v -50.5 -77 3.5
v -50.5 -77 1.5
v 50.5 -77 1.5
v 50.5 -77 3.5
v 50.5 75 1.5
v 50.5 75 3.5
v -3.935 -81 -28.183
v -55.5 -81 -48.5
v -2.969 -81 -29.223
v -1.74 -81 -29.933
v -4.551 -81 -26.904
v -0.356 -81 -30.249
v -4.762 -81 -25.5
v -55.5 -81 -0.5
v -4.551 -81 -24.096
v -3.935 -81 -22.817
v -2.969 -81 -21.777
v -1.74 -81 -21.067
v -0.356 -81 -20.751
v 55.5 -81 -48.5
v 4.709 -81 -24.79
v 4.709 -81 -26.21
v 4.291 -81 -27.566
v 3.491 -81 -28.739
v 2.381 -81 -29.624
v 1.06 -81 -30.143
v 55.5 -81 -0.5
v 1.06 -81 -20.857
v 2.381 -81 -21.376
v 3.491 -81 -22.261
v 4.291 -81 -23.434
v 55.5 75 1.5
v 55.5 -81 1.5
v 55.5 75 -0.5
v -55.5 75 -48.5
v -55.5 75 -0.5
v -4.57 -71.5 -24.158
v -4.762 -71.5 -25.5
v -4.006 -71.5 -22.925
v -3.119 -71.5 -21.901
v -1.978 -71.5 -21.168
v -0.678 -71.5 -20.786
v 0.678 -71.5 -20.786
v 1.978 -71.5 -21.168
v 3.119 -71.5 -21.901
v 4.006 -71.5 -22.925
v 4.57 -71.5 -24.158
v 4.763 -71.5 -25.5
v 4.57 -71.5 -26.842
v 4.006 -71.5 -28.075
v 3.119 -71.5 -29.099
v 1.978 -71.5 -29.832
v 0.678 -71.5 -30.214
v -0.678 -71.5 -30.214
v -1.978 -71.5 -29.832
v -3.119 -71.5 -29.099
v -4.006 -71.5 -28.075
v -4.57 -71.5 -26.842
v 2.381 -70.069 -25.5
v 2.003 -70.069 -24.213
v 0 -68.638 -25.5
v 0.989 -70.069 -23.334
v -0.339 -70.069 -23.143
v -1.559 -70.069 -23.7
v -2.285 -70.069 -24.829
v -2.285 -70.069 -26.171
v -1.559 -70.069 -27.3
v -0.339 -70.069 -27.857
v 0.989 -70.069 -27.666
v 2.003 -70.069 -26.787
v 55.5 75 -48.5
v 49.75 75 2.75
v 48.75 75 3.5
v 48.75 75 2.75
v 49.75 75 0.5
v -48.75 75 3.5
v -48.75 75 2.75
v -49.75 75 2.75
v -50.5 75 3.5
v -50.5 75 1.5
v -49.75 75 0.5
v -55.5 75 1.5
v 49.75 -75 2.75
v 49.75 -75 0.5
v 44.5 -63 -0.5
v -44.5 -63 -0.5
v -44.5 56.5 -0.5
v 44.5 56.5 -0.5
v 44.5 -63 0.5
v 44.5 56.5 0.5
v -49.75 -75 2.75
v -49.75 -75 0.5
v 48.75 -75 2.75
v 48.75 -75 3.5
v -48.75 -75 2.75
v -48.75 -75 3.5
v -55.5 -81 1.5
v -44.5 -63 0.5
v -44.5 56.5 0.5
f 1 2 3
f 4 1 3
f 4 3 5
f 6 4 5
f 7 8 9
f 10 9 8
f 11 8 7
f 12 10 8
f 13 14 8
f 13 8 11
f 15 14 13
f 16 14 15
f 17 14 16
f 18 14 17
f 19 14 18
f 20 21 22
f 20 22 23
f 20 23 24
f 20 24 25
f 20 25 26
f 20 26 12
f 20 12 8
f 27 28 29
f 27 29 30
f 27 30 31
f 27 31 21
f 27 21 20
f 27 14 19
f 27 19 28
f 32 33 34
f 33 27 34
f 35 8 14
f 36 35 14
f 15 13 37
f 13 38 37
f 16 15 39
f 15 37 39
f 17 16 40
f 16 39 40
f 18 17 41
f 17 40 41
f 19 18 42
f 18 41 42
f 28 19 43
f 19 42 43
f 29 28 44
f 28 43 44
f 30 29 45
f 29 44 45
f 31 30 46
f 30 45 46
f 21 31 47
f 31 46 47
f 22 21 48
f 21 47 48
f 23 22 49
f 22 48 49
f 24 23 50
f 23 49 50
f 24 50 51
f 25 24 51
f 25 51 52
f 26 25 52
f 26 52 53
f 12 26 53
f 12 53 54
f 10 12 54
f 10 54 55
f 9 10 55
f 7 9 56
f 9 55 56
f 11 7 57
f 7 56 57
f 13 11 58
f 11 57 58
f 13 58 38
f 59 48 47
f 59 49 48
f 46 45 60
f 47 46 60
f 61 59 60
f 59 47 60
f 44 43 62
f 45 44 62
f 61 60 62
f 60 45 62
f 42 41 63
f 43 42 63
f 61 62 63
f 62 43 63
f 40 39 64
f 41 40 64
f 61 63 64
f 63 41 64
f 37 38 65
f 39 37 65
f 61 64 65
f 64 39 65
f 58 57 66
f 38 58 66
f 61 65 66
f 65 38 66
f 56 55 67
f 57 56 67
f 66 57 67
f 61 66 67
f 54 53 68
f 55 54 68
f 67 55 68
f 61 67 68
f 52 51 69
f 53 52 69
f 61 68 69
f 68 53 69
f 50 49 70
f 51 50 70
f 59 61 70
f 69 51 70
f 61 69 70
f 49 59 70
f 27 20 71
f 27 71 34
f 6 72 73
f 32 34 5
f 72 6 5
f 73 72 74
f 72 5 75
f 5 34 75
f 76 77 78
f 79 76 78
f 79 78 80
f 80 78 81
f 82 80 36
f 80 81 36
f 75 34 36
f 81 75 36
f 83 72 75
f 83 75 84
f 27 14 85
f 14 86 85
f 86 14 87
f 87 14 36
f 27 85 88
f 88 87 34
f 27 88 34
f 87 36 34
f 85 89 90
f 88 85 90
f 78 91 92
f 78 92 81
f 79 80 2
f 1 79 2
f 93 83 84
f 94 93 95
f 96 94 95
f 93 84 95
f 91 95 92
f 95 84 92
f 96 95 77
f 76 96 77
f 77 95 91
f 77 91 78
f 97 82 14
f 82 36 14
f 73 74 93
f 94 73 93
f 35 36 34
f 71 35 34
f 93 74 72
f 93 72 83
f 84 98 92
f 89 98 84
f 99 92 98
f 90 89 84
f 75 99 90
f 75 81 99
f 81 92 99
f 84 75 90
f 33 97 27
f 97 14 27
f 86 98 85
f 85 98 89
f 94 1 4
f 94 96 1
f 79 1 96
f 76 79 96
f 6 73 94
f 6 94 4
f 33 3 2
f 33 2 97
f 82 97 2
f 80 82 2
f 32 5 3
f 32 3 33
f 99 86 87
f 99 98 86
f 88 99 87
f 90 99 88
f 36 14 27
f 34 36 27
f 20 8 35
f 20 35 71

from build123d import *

# Parameters (mm, degrees)
F0_W      = 97.5
F0_H      = 150
F0_W_2    = 89
F0_H_2    = 119.5
F1_DEPTH  = 0.5
F3_DEPTH  = 1
F5_DEPTH  = 3
F6_W      = 150
F6_H      = 2.25
F7_DEPTH  = 1
F8_W      = 150
F8_H      = 2.25
F9_DEPTH  = 1
F10_W     = 111
F10_H     = 48
F11_DEPTH = 156
F13_D     = 9.525
F13_DEPTH = 9.5
F13_TIP   = 2.8615986981


with BuildPart() as f1:
    # F0 (on Top) → F1 (new body, symmetric)
    with BuildSketch(Plane.XY):
        Polygon((-50.5, -77), (-50.5, 75), (-55.5, 75), (-55.5, -81), (55.5, -81), (55.5, 75), (50.5, 75), (50.5, -77), align=None)
        Rectangle(F0_W, F0_H)
        with Locations((0, -3.25)):
            Rectangle(F0_W_2, F0_H_2, mode=Mode.SUBTRACT)
        Polygon((-48.75, -75), (-48.75, 75), (-50.5, 75), (-50.5, -77), (50.5, -77), (50.5, 75), (48.75, 75), (48.75, -75), align=None)
    extrude(amount=F1_DEPTH, both=True)

    # F2 (on face) → F3 (join)
    with BuildSketch(Plane.XY.offset(0.5)):
        Polygon((-50.5, -77), (-50.5, 75), (-55.5, 75), (-55.5, -81), (55.5, -81), (55.5, 75), (50.5, 75), (50.5, -77), align=None)
    extrude(amount=F3_DEPTH)

    # F4 (on face) → F5 (join)
    with BuildSketch(Plane.XY.offset(0.5)):
        Polygon((-48.75, -75), (-48.75, 75), (-50.5, 75), (-50.5, -77), (50.5, -77), (50.5, 75), (48.75, 75), (48.75, -75), align=None)
    extrude(amount=F5_DEPTH)

    # F6 (on face) → F7 (cut)
    with BuildSketch(Plane.YZ.offset(-48.75)):
        with Locations((0, 1.625)):
            Rectangle(F6_W, F6_H)
    extrude(amount=-F7_DEPTH, mode=Mode.SUBTRACT)

    # F8 (on face) → F9 (cut)
    with BuildSketch(Plane(origin=(48.75, 0, 0), x_dir=(0, -1, 0), z_dir=(-1, 0, 0))):
        with Locations((0, 1.625)):
            Rectangle(F8_W, F8_H)
    extrude(amount=-F9_DEPTH, mode=Mode.SUBTRACT)


with BuildPart() as f11:
    # F10 (on face) → F11 (new body)
    with BuildSketch(Plane.XZ.offset(81)):
        with Locations((0, -24.5)):
            Rectangle(F10_W, F10_H)
    extrude(amount=-F11_DEPTH)

    # F13
    with Locations(Plane.XZ.offset(81)):
        with Locations((0, -25.5)):
            Hole(F13_D / 2, depth=F13_DEPTH)
            with Locations((0, 0, -(F13_DEPTH + F13_TIP / 2))):  # 118° drill point
                Cone(0, F13_D / 2, F13_TIP, mode=Mode.SUBTRACT)


solid = Compound([f1.part, f11.part])
